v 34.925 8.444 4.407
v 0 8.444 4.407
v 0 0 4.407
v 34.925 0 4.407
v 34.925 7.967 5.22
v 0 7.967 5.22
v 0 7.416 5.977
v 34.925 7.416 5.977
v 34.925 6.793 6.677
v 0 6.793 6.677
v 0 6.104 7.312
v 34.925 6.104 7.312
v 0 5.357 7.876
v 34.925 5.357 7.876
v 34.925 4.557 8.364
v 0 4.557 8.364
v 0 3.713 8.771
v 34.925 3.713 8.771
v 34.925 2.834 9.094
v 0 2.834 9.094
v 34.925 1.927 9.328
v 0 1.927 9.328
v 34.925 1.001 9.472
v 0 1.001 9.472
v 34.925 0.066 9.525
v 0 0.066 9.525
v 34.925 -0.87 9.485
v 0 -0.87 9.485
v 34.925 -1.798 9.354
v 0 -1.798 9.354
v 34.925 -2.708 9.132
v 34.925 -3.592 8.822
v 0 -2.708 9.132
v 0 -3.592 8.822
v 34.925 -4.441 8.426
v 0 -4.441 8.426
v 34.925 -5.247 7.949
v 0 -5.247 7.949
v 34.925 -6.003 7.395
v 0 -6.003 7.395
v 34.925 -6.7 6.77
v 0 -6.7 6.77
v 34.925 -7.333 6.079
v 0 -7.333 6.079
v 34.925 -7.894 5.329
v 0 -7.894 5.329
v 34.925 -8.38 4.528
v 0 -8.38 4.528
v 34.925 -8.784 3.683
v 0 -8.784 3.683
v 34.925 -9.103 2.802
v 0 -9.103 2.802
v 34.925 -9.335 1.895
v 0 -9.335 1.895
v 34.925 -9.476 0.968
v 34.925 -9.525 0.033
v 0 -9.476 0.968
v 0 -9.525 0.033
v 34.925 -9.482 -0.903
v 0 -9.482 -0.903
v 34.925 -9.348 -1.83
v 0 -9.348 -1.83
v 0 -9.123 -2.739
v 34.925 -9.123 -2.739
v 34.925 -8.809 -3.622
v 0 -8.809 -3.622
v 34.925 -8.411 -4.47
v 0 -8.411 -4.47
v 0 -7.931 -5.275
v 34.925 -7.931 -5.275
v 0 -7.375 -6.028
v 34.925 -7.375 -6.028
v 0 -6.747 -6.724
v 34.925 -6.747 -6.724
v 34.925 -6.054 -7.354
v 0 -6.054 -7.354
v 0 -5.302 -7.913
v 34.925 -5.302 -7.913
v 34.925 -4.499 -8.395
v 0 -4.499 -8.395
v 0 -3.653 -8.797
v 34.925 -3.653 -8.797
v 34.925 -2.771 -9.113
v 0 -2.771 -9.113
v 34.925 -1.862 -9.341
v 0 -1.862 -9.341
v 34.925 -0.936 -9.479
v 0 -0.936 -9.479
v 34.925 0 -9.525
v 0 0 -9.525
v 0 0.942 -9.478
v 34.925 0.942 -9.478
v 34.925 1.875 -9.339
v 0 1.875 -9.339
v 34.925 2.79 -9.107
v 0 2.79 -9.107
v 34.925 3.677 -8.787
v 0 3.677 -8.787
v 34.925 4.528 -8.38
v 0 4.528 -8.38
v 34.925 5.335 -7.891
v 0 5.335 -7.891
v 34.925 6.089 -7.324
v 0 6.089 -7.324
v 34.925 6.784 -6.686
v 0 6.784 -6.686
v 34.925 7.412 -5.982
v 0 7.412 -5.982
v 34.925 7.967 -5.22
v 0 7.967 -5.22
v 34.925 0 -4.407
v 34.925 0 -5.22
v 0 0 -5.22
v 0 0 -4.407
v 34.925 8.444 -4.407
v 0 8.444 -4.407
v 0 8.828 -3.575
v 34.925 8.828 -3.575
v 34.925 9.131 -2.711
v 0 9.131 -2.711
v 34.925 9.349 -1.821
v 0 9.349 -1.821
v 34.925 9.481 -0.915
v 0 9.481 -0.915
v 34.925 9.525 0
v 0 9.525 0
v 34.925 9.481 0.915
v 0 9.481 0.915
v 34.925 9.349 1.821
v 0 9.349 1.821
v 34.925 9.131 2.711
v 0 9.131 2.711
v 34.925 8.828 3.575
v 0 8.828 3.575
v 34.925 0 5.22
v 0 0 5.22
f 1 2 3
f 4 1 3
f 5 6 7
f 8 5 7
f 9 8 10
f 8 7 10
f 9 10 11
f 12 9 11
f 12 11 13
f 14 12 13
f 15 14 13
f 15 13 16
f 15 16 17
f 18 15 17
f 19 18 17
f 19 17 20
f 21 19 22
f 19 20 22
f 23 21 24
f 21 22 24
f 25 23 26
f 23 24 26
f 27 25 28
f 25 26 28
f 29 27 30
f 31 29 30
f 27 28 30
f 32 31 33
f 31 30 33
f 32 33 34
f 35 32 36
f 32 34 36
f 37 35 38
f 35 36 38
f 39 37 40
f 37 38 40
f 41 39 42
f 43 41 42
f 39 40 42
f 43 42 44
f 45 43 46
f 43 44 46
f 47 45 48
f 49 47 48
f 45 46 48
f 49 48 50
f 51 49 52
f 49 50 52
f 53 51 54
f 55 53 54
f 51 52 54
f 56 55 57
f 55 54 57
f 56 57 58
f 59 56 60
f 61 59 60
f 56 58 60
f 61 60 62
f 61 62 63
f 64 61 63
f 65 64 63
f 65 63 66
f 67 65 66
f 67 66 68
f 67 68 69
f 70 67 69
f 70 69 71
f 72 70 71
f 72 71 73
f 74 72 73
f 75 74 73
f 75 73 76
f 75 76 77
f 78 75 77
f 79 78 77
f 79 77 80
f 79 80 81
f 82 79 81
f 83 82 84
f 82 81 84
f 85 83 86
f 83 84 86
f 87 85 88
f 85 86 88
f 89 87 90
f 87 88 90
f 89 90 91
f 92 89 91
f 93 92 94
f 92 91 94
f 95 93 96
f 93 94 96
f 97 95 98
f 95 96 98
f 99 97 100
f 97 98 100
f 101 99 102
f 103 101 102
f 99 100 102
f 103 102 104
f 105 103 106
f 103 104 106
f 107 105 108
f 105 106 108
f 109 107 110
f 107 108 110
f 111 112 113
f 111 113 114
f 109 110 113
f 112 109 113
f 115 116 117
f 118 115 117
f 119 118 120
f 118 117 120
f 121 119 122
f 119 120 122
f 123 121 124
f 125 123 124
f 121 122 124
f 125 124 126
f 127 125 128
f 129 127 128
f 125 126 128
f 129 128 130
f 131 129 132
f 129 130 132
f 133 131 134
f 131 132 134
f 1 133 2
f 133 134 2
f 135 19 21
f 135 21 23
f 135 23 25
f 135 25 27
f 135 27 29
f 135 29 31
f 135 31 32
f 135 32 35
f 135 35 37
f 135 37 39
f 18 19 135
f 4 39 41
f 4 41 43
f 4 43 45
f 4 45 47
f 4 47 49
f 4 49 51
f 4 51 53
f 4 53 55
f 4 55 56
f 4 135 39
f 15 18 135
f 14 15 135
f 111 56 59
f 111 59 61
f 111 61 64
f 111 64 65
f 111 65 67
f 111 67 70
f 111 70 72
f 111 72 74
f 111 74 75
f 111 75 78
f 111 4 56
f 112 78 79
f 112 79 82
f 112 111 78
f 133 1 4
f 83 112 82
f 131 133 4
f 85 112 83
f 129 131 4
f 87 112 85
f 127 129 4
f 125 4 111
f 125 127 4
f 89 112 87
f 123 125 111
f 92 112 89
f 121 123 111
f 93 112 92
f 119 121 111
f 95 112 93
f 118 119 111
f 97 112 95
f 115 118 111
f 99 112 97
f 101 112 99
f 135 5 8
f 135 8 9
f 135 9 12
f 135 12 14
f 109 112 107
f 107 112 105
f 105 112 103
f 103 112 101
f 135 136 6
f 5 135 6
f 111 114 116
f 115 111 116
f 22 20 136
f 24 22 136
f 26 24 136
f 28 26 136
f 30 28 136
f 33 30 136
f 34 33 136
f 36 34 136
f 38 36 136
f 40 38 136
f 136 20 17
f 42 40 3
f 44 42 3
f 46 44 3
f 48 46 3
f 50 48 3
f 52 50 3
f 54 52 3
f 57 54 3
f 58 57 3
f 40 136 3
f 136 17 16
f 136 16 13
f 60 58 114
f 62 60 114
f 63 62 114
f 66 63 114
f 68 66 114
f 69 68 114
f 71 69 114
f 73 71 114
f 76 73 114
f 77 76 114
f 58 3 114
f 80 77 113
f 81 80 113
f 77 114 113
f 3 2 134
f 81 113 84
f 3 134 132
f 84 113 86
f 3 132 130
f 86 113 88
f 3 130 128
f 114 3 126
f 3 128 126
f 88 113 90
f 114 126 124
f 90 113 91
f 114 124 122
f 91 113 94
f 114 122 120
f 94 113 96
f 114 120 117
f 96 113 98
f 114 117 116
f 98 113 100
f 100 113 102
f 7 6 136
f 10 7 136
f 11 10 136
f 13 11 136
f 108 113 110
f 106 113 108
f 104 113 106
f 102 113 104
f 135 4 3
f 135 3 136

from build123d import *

# Parameters (mm, degrees)
BOSS_EXTRUDE1_DEPTH = 34.925


with BuildPart() as part:
    # Sketch1 → Boss-Extrude1 (new body)
    with BuildSketch(Plane(origin=(0, 0, 0), x_dir=(0, 0, -1), z_dir=(1, 0, 0))):
        with BuildLine():
            Line((-4.4069, 8.444220354), (-4.4069, 0))
            Line((-4.4069, 0), (4.4069, 0))
            Line((4.4069, 0), (4.4069, 8.444220354))
            ThreePointArc((4.4069, 8.444220354), (0, 9.525), (-4.4069, 8.444220354))
        make_face()
        with BuildLine():
            Line((4.4069, 0), (-4.4069, 0))
            Line((-4.4069, 0), (-5.2197, 0))
            Line((-5.2197, 0), (-5.2197, 7.967456113))
            ThreePointArc((-5.2197, 7.967456113), (-4.528133307, -8.379834948), (9.525, 0))
            ThreePointArc((9.525, 0), (8.379834948, 4.528133307), (5.2197, 7.967456113))
            Line((5.2197, 7.967456113), (5.2197, 0))
            Line((5.2197, 0), (4.4069, 0))
        make_face()
    extrude(amount=BOSS_EXTRUDE1_DEPTH)


solid = part.part
